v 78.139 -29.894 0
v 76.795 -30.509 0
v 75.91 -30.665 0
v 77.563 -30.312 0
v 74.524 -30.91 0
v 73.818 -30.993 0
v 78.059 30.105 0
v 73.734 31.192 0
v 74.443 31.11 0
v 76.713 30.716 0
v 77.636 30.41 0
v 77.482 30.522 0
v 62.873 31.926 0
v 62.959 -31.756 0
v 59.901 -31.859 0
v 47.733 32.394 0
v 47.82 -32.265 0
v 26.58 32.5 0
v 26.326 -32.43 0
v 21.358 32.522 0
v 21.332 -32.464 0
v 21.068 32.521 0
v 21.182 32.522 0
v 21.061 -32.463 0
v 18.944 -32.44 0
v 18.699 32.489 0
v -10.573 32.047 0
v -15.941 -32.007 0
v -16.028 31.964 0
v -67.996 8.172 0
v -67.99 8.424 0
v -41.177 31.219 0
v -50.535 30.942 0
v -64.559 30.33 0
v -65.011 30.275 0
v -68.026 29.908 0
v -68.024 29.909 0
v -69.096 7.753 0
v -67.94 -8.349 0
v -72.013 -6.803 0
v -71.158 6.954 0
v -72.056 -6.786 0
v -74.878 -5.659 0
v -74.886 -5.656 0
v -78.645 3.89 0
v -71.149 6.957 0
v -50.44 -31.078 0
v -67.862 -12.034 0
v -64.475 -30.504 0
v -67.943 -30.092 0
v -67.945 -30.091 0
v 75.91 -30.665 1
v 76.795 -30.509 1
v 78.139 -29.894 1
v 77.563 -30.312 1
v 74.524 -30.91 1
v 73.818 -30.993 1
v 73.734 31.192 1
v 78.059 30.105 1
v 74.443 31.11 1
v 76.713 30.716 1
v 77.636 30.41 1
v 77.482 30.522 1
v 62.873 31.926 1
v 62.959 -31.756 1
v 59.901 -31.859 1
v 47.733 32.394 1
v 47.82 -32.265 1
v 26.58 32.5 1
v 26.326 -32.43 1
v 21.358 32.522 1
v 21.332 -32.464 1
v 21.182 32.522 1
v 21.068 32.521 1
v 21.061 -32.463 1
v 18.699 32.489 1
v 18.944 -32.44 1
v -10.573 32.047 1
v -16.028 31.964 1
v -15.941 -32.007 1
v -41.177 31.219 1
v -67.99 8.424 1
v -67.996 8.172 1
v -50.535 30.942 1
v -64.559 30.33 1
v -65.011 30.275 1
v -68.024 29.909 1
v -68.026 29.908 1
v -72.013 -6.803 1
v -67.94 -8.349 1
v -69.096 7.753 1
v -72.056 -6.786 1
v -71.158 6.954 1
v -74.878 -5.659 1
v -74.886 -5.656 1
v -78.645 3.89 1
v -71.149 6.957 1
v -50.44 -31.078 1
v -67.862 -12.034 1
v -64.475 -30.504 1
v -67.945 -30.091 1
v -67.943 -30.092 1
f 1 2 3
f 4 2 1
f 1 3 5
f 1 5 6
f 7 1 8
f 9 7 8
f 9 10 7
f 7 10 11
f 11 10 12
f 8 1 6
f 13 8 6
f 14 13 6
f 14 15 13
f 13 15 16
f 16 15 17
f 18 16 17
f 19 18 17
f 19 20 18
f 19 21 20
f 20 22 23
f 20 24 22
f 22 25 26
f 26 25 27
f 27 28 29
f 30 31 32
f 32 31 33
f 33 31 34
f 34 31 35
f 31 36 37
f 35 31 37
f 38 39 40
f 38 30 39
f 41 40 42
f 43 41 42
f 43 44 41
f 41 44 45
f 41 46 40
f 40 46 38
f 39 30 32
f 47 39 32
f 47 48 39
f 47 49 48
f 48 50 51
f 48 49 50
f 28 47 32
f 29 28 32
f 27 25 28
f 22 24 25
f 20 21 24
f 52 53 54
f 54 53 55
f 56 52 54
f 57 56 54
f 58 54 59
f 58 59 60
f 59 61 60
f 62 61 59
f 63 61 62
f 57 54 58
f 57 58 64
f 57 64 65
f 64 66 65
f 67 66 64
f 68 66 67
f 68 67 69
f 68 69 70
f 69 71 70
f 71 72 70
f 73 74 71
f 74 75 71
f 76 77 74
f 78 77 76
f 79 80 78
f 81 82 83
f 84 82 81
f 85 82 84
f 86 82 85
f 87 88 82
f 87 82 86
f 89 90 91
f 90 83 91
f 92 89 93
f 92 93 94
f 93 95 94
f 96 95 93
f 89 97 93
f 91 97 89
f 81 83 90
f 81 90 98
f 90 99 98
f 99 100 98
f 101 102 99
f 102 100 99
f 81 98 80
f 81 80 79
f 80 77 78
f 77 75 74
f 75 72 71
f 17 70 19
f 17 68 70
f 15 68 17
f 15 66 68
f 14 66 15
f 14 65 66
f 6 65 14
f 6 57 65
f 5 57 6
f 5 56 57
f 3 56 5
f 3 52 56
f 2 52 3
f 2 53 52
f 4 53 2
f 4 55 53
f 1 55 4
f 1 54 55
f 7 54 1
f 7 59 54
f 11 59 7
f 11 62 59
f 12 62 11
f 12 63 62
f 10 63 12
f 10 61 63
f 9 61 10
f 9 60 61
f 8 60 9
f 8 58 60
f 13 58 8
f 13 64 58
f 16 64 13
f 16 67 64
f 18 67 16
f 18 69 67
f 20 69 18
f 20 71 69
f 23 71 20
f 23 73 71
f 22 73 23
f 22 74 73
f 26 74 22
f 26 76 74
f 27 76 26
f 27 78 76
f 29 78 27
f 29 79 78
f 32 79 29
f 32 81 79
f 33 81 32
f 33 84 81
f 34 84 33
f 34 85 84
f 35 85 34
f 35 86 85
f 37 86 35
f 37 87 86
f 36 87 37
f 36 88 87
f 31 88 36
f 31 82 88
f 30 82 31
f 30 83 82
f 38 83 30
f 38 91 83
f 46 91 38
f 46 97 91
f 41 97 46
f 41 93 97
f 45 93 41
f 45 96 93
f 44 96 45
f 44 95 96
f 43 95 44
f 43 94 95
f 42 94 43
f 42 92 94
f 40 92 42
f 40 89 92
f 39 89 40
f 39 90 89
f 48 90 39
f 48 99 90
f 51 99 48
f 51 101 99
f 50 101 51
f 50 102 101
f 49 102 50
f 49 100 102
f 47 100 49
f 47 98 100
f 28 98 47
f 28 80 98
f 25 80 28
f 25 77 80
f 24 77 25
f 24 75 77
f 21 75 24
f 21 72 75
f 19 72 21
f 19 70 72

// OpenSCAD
// Generated by SolidPython 1.1.3 on 2024-05-19 22:43:27


linear_extrude(height = 1) {
	polygon(points = [[-74.8856000000, -5.6562200000], [-74.8780000000, -5.6592000000], [-72.0560000000, -6.7864300000], [-72.0130000000, -6.8028000000], [-67.9403000000, -8.3488400000], [-67.8616000000, -12.0336000000], [-67.9450000000, -30.0915000000], [-67.9427000000, -30.0918000000], [-64.4747000000, -30.5041000000], [-61.8854000000, -30.6100000000], [-50.4400000000, -31.0781000000], [-15.9414000000, -32.0069000000], [18.9437000000, -32.4402000000], [21.0607000000, -32.4628000000], [21.3319000000, -32.4643000000], [26.3256000000, -32.4302000000], [46.5825000000, -32.2747000000], [47.8201000000, -32.2652000000], [59.9015000000, -31.8587000000], [62.9593000000, -31.7559000000], [68.7254000000, -31.3509000000], [73.8182000000, -30.9932000000], [74.0637000000, -30.9641000000], [74.5240000000, -30.9096000000], [75.9102000000, -30.6651000000], [76.7953000000, -30.5089000000], [77.3155000000, -30.3759000000], [77.5633000000, -30.3125000000], [77.9596000000, -30.0250000000], [78.1395000000, -29.8945000000], [78.0586000000, 30.1055000000], [77.6362000000, 30.4103000000], [77.4816000000, 30.5219000000], [76.7127000000, 30.7163000000], [74.4429000000, 31.1105000000], [73.7344000000, 31.1925000000], [71.5680000000, 31.3388000000], [62.8734000000, 31.9259000000], [48.9339000000, 32.3573000000], [47.7328000000, 32.3945000000], [26.5804000000, 32.4999000000], [21.3576000000, 32.5217000000], [21.1817000000, 32.5217000000], [21.0682000000, 32.5209000000], [18.6990000000, 32.4893000000], [-10.5730000000, 32.0467000000], [-16.0278000000, 31.9642000000], [-41.1768000000, 31.2192000000], [-50.5347000000, 30.9419000000], [-56.8153000000, 30.6680000000], [-64.5586000000, 30.3303000000], [-65.0109000000, 30.2753000000], [-68.0236000000, 29.9088000000], [-68.0256000000, 29.9085000000], [-68.0259000000, 29.9085000000], [-67.9904000000, 8.4235300000], [-67.9958000000, 8.1722400000], [-69.0956000000, 7.7532700000], [-71.1488000000, 6.9571000000], [-71.1576000000, 6.9536100000], [-78.6449000000, 3.8903000000]]);
}
/***********************************************
*********      SolidPython code:      **********
************************************************
 
import math
import time

from stl import mesh, Dimension

from tkinter import Tk     # from tkinter import Tk for Python 3.x
from tkinter.filedialog import askopenfilename
from mpl_toolkits.mplot3d import art3d
from matplotlib import pyplot as plt
import solid
import os
import ezdxf
import shapely.geometry as sg
import subprocess
from GUI import getSCADPath



def outputSTL(From, To, PATH=getSCADPath()):
    subprocess.Popen(PATH + " -o " + To + " " + From)
    while not os.path.exists(To):
        time.sleep(1)


def get_size(i):
    x_list = [int(a) for a in str(i)]
    return len(x_list)



class Model:
    def __init__(self, model, fileName, location, layer, thickness):
        self.location = location
        self.code = None
        self.fileName = fileName
        self.stl = fileName + ".stl"
        self.layer = layer
        self.thickness = thickness
        self.maxz = (layer+1)*thickness
        self.dxf = fileName + ".dxf"
        self.scad = fileName + ".scad"
        self.model = model
        self.center = None
        self.width = 10
        self.mesh = None
        self.useable_area = None


    def get_code(self):
        max_dim = 0.05
        max_array = 6

        num = int(self.fileName)
        nums = [int(a) for a in str(num)]
        nums.reverse()
        indices = nums
        length = len(nums)

        print(indices)
        t = 0
        i = 0
        cubes = []
        x = 0
        y = 0
        width = 0.01
        while x <= max_dim:
            while y <= max_dim:
                print(indices)
                if nums == []:
                    break
                if indices[0] != 0:
                    cubes.append(solid.translate([x, y, 0])(solid.cube(size=t / 1000 + 0.001)))
                    y += max_dim / (max_array - 1)
                    nums[0] = nums[0] - 1
                else:
                    indices.pop(0)
                    t += 1
                i += 1
            x += max_dim / (max_array - 1)
            y = 0

        outside = solid.translate([-width / 2, -width / 2])(solid.cube(max_dim + (length - 1) / 1000 + 0.001 + width))
        self.code = solid.difference()(outside, cubes)
        self.code = solid.projection(cut=True)(self.code)
        solid.scad_render_to_file(self.code, self.location + "/code.scad")
        outputSTL(From=self.location+"/code.scad", To=self.location+"code.dxf", PATH=getSCADPath())
        # os.system("toSTL.sh renders/code.scad renders/code.dxf")
        return self.location+"/code.dxf"

    def download(self, type):
        if type =="stl":
            print("generating:" + self.location+"/"+ self.fileName+".stl")
            outputSTL(From=self.location+"/"+self.fileName+".scad", To=self.location+"/"+self.fileName+".stl")
            # os.system("toSTL.sh renders/"+ self.fileName+".scad renders/"+ self.fileName+".stl")
        elif type == "dxf":
            outputSTL(From=self.location+"/"+self.fileName+".scad", To=self.location+"/"+self.fileName+".dxf")
            # os.system("toSTL.sh renders/"+ self.fileName+".scad renders/"+ self.fileName+".dxf")

    def render(self):
        solid.scad_render_to_file(self.model, self.location+"/"+ self.fileName+'.scad')
        while not os.path.exists(self.location+"/"+self.fileName+".scad"):
            time.sleep(1)

    def get_points(self):
        doc = ezdxf.readfile(filename=self.location+"/"+ self.fileName+".dxf")
        msp = doc.modelspace()
        i=0
        lists = []
        def helper(e):
            start = [e.dxf.start[0], e.dxf.start[1]]
            end = [e.dxf.end[0], e.dxf.end[1]]
            return [start, end]

        for e in msp.query("LINE"):
            line = helper(e)
            if not lists:
                lists.append([line])
            else:
                if lists[i][len(lists)-1][1] != line[0]:
                    lists.append([line])
                    i+=1
                else:
                    lists[i].append(line)

    def get_points2(self, FILE):
        doc = ezdxf.readfile(filename=FILE)
        msp = doc.modelspace()
        i = 0
        lists = []

        def helper(e):
            start = [e.dxf.start[0], e.dxf.start[1]]
            end = [e.dxf.end[0], e.dxf.end[1]]
            return (start, end)

        for e in msp.query("LINE"):
            line = helper(e)
            if lists==[]:
                lists.append([line])
            else:
                if lists[i][len(lists[i]) - 1][1] != line[0]:
                    lists.append([line])
                    i += 1
                else:
                    lists[i].append(line)
        return lists

    def add_code(self):
        dxf = solid.projection(cut=False)(self.model)
        offset = solid.offset(r=-0.1)(dxf)
        solid.scad_render_to_file(offset, self.location+'/offset.scad')
        os.system("toSTL.sh renders/offset.scad renders/offset.dxf")
        lines = self.get_points2("renders/offset.dxf")
        x = lines[0][0][0][0]
        y = lines[0][0][0][1]
        print(x)
        print(y)
        code = solid.translate([x,y,0])(self.code)
        code = solid.linear_extrude(height=999)(code)
        save = self.model
        self.model = solid.projection()(solid.difference()(self.model, code))
        self.render()
        self.download("dxf")
        self.model = save

    def add_label(self, pos):
        # num = 12
        # minx, maxx, miny, maxy, minz, maxz = self.find_minmax()
        maxz = self.maxz
        # label = solid.linear_extrude(height=(maxz-minz)/3)(solid.text(str(self.fileName), size=0.5, halign="center"))
        # i=minx
        # print("x-len: " + str(maxx-minx))
        # print(i)
        # inc = (maxx-minx)/num
        # while minx <= i <= maxx:
        #     label = solid.union()(solid.translate([i, 0, maxz - 0.2])(solid.linear_extrude(height=(maxz-minz)/3)(solid.text(str(self.fileName), size=0.25, halign="center"))), label)
        #     i += inc
        #
        # l = label
        #
        # i =miny
        # while miny<= i <= maxy:
        #     print("y inc")
        #     l = solid.union()(solid.translate([0, i, 0])(label), l)
        #     i += 0.5
        for i in str(self.fileName):
            cur = pos[0]
            label = solid.translate([pos[0][0], pos[0][1], self.maxz-0.2])(solid.linear_extrude(height=(self.thickness)/3)(solid.text(str(i), size=0.5, halign="center", valign="center")))
            self.model = solid.difference()(self.model, label)
            pos.append(pos.pop(0))
            while abs(cur[0]-pos[0][0])<0.5 and abs(cur[1]-pos[0][1])<0.5:
                pos.append(pos.pop(0))



    def Center(self):

        volume, cog, inertia = self.mesh.get_mass_properties()
        print("Volume                                  = {0}".format(volume))
        print("Position of the center of gravity (COG) = {0}".format(cog))
        m_centered = solid.translate([-cog[0], -cog[1], 0])(
            self.model
        )
        return m_centered

    def find_minmax(self):
        minx = maxx = miny = maxy = minz = maxz = None
        for p in self.mesh.points:
            # p contains (x, y, z)
            if minx is None:
                minx = p[Dimension.X]
                maxx = p[Dimension.X]
                miny = p[Dimension.Y]
                maxy = p[Dimension.Y]
                minz = p[Dimension.Z]
                maxz = p[Dimension.Z]
            else:
                maxx = max(p[Dimension.X], maxx)
                minx = min(p[Dimension.X], minx)
                maxy = max(p[Dimension.Y], maxy)
                miny = min(p[Dimension.Y], miny)
                maxz = max(p[Dimension.Z], maxz)
                minz = min(p[Dimension.Z], minz)
        lenx = maxx - minx
        leny = maxy - miny
        lenz = maxz - minz
        return minx, maxx, miny, maxy, minz, maxz

    # def generate_Mesh(self):
    #     self.mesh = mesh.Mesh.from_file(self.location + "/" + str(int(self.fileName)//8)+ "b.stl")

    def get_top(self):
        top = solid.projection(cut=True)(solid.translate([0,0,-1*self.thickness*(self.layer+1)])(self.model))
        useable_area = solid.offset(r=-0.45)(top)
        self.useable_area = useable_area
        solid.scad_render_to_file(self.useable_area, self.location+'/' + 'toptemp.scad')
        outputSTL(From=self.location+'/' + 'toptemp.scad', To=self.location+"/top"+ self.dxf)

        # os.system("toSTL.sh out/toptemp.scad renders/" + self.fileName + ".dxf")
        dxf = DXF(self.location+"/top"+ self.dxf)
        min_p=dxf.points[0][0]
        points_ordered = dxf.points
        i=0
        while i <= len(dxf.points)+1:
            while math.sqrt((dxf.points[0][0]-dxf.points[1][0])**2+(dxf.points[0][1]-dxf.points[1][1])**2) > 0.1:
                dxf.points.insert(1, [(dxf.points[0][0]+dxf.points[1][0])/2, (dxf.points[0][1]+dxf.points[1][1])/2])
                i = i-1
            dxf.points.append(dxf.points.pop(0))
            i+=1
        for i in range(len(dxf.points)):
            dxf.points.append(dxf.points.pop(0))
            if dxf.points[0][0] < min_p:
                min_p = dxf.points[0][0]
                points_ordered = dxf.points.copy()
        dxf.points = points_ordered.copy()

        print(dxf.points)
        self.add_label(dxf.points)

class DXF:
    def __init__(self, file):
        self.file = file
        self.Lines = []
        self.points = []
        doc = ezdxf.readfile(self.file)
        msp = doc.modelspace()
        for e in msp:
            if e.dxftype() == "LINE":
                self.Lines.append(e)
                self.points.append([e.dxf.start[0], e.dxf.start[1]])
        # self.points.append([self.Lines[-1].dxf.end[0], self.Lines[-1].dxf.end[1]])
        self.area = None
        self.center = None
        self.polygon = sg.Polygon(self.points)

    def get_area(self):
        self.area = self.polygon.area
        return self.area

    def get_center(self):
        x_sum = 0
        y_sum =0
        for i in self.points:
            x_sum += i[0]
            y_sum += i[1]
        x_c = x_sum/len(self.points)
        y_c = y_sum/len(self.points)
        return (x_c, y_c)

    def split(self, maxdim):
        length = 0
        key_points = [[]]
        prev = self.points[0]
        for j in self.points:
            length = length + math.sqrt((prev[0]-j[0])**2+(prev[1]-j[1])**2)
            if length >= maxdim:
                key_points[-1].append(j)
                length = 0
        for j in key_points:
            piece = solid.linear_extrude(height=1)(solid.polygon(j))
        solid.scad_render_to_file(piece, "testSplit.scad")


if __name__== "__main__":
    test = DXF("C:/Users/Daniel/Documents/repos/Shell_Maker/output/0top_slice.dxf")
    test.split(10)

 
 
************************************************/
